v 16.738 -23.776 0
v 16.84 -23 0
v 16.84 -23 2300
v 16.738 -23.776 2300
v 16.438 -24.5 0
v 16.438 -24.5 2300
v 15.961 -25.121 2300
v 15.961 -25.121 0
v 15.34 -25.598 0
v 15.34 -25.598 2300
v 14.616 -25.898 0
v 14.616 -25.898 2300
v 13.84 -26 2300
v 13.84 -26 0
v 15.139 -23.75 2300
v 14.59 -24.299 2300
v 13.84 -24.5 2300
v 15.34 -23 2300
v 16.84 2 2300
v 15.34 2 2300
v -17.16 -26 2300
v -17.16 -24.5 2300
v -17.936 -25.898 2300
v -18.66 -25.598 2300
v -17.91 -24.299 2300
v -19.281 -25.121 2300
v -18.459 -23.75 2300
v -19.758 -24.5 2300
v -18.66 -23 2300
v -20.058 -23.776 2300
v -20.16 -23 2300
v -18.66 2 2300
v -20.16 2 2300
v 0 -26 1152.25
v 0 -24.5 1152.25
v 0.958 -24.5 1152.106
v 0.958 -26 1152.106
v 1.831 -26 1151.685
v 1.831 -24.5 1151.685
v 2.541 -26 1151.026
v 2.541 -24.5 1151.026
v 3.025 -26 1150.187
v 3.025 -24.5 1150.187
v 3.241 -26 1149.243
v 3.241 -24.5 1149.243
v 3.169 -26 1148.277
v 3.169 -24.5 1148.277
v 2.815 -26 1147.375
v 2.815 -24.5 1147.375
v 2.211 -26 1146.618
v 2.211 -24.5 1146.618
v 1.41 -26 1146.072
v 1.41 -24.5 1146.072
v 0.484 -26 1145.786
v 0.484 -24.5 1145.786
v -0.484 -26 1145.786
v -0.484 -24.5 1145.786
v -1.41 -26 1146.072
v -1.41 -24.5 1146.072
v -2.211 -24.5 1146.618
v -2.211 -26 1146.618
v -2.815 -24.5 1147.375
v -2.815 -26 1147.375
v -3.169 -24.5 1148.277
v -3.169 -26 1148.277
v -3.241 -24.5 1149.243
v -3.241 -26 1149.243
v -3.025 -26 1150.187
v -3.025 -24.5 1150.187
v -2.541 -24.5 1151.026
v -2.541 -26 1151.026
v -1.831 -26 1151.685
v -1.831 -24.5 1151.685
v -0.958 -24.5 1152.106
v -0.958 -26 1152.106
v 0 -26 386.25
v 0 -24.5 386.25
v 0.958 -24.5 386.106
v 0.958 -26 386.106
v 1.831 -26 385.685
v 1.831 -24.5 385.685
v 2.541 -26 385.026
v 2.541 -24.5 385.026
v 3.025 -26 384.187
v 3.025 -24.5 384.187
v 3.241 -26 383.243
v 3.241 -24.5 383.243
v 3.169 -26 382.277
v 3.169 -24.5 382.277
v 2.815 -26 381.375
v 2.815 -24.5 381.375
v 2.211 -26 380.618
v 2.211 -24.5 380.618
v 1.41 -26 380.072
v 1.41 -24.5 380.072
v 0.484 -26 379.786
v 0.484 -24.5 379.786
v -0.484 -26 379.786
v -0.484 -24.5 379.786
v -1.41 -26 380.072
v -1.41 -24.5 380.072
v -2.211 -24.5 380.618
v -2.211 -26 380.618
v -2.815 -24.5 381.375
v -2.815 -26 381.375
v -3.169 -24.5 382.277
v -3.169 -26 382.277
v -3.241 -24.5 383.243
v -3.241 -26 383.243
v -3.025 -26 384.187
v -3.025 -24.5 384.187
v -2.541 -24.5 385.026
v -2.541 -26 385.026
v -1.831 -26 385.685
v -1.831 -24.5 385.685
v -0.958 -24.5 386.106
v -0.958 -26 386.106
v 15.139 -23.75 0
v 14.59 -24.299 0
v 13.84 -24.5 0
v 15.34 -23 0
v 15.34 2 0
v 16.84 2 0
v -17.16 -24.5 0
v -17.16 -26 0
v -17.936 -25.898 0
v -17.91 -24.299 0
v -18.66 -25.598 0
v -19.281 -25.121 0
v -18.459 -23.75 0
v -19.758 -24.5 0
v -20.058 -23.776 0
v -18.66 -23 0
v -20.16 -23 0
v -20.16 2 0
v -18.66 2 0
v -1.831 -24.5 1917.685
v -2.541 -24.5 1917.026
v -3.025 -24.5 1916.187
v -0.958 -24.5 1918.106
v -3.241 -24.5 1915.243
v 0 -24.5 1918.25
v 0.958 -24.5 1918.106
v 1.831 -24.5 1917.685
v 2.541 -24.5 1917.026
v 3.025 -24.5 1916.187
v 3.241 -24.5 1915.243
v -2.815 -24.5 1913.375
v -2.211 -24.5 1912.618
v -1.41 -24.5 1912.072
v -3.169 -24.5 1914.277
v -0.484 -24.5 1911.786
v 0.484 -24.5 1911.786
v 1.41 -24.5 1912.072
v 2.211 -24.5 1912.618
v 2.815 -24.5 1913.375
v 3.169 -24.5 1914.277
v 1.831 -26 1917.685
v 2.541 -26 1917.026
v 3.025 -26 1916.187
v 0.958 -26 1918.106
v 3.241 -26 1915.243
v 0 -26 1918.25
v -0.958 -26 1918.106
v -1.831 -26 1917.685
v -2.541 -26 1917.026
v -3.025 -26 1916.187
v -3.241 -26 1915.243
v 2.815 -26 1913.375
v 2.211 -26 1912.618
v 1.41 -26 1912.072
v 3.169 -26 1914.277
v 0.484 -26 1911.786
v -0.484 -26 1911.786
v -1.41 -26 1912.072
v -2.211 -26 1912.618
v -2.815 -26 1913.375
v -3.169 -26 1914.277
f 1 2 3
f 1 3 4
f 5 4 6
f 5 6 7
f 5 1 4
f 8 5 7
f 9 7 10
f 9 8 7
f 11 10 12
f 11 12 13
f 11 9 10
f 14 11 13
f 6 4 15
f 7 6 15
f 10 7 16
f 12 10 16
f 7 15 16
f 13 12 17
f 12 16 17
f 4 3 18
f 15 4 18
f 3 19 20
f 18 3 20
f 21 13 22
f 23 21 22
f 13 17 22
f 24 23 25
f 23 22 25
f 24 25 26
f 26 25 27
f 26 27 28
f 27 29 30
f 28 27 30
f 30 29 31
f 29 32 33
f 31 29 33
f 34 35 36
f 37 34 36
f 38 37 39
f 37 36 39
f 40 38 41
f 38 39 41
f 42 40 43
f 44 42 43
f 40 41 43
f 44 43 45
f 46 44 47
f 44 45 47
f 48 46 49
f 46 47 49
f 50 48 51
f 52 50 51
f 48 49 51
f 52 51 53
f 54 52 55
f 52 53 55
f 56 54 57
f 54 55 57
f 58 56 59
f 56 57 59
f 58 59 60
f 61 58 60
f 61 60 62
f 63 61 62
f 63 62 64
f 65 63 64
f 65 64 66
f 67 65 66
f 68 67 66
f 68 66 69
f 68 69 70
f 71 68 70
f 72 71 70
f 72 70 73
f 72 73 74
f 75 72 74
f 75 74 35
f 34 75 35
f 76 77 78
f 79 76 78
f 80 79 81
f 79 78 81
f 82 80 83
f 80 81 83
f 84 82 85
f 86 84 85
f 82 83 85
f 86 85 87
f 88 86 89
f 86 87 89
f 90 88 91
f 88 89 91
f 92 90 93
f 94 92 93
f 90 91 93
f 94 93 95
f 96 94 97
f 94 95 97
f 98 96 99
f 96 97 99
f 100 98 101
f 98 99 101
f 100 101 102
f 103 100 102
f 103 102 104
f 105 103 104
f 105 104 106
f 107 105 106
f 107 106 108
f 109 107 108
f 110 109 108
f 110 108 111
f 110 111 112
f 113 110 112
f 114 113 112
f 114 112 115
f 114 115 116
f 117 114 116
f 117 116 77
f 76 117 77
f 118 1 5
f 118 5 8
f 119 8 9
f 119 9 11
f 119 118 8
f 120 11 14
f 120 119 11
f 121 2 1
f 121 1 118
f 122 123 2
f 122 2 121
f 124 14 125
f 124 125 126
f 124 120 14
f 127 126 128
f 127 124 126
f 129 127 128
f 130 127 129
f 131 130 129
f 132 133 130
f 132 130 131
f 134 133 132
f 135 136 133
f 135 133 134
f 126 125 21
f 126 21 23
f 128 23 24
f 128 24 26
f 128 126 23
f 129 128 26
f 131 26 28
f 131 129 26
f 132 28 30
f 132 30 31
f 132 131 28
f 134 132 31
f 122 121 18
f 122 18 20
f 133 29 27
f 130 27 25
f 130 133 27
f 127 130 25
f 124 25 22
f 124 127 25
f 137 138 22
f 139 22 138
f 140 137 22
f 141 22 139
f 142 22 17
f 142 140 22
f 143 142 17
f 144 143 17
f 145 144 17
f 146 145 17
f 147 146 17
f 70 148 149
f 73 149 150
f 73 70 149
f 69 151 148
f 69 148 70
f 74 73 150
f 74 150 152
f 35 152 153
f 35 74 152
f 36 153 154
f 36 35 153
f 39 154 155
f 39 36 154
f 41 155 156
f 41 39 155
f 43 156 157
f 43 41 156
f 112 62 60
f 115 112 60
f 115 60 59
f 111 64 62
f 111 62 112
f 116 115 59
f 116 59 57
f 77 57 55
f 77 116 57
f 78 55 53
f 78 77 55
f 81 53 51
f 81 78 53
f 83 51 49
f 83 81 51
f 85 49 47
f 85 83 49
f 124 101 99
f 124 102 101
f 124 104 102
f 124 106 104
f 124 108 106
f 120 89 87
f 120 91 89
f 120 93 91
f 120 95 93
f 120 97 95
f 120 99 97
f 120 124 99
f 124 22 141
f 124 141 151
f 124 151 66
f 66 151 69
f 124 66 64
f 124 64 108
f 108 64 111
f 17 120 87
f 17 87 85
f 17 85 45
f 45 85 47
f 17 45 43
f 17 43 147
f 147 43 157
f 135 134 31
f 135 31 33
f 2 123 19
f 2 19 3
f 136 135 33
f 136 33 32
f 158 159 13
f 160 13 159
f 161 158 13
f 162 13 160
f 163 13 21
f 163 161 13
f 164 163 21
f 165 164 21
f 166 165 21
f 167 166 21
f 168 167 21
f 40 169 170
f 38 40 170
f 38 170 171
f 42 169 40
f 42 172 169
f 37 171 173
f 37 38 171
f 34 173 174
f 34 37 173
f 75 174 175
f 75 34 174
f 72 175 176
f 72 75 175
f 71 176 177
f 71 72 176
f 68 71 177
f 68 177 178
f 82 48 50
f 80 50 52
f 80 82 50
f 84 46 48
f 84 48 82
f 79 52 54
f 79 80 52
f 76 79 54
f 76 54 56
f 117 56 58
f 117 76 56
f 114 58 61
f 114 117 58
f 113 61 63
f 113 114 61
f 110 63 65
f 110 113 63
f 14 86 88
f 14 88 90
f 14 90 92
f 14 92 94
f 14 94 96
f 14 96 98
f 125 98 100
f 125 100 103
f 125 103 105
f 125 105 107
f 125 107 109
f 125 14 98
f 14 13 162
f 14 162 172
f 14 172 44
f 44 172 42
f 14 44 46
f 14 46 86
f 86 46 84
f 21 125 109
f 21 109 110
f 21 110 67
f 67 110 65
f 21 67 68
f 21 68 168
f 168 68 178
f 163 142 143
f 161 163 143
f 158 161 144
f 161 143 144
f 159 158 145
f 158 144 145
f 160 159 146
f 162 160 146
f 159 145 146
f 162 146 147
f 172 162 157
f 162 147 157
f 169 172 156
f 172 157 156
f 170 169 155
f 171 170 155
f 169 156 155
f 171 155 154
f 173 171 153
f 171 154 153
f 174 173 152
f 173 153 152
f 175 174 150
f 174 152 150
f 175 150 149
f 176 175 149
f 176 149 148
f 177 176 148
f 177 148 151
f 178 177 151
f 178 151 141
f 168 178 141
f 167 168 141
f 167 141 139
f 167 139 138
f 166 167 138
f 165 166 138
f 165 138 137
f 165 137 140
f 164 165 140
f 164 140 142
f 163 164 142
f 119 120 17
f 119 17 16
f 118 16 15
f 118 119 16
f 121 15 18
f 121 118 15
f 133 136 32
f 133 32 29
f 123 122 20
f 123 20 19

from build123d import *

# Parameters (mm, degrees)
EXTRUDE_THIN1_DEPTH = 2300
SKETCH2_R           = 3.25
CUT_EXTRUDE1_DEPTH  = 10
LPATTERN1_COUNT     = 3
LPATTERN1_PITCH     = 766


with BuildPart() as part:
    # Sketch1 → Extrude-Thin1 (new body)
    with BuildSketch(Plane.XY):
        with BuildLine():
            Line((16.84, 2), (16.84, -23))
            ThreePointArc((16.84, -23), (15.961320344, -25.121320344), (13.84, -26))
            Line((13.84, -26), (-17.16, -26))
            ThreePointArc((-17.16, -26), (-19.281320344, -25.121320344), (-20.16, -23))
            Line((-20.16, -23), (-20.16, 2))
            Line((-20.16, 2), (-18.66, 2))
            Line((-18.66, 2), (-18.66, -23))
            ThreePointArc((-18.66, -23), (-18.220660172, -24.060660172), (-17.16, -24.5))
            Line((-17.16, -24.5), (13.84, -24.5))
            ThreePointArc((13.84, -24.5), (14.900660172, -24.060660172), (15.34, -23))
            Line((15.34, -23), (15.34, 2))
            Line((15.34, 2), (16.84, 2))
        make_face()
    extrude(amount=EXTRUDE_THIN1_DEPTH)

    # Sketch2 → Cut-Extrude1 (cut)
    with BuildSketch(Plane(origin=(0, -24.5, 0), x_dir=(1, 0, 0), z_dir=(0, 1, 0))):
        with Locations(Location((0, -383, 0), (0, 0, 270))):
            Circle(SKETCH2_R)
    cut_extrude1 = extrude(amount=-CUT_EXTRUDE1_DEPTH, mode=Mode.SUBTRACT)

    # LPattern1: Cut-Extrude1 ×3
    with Locations(*[(0, 0, i * LPATTERN1_PITCH) for i in range(1, LPATTERN1_COUNT)]):
        add(cut_extrude1, mode=Mode.SUBTRACT)


solid = part.part
